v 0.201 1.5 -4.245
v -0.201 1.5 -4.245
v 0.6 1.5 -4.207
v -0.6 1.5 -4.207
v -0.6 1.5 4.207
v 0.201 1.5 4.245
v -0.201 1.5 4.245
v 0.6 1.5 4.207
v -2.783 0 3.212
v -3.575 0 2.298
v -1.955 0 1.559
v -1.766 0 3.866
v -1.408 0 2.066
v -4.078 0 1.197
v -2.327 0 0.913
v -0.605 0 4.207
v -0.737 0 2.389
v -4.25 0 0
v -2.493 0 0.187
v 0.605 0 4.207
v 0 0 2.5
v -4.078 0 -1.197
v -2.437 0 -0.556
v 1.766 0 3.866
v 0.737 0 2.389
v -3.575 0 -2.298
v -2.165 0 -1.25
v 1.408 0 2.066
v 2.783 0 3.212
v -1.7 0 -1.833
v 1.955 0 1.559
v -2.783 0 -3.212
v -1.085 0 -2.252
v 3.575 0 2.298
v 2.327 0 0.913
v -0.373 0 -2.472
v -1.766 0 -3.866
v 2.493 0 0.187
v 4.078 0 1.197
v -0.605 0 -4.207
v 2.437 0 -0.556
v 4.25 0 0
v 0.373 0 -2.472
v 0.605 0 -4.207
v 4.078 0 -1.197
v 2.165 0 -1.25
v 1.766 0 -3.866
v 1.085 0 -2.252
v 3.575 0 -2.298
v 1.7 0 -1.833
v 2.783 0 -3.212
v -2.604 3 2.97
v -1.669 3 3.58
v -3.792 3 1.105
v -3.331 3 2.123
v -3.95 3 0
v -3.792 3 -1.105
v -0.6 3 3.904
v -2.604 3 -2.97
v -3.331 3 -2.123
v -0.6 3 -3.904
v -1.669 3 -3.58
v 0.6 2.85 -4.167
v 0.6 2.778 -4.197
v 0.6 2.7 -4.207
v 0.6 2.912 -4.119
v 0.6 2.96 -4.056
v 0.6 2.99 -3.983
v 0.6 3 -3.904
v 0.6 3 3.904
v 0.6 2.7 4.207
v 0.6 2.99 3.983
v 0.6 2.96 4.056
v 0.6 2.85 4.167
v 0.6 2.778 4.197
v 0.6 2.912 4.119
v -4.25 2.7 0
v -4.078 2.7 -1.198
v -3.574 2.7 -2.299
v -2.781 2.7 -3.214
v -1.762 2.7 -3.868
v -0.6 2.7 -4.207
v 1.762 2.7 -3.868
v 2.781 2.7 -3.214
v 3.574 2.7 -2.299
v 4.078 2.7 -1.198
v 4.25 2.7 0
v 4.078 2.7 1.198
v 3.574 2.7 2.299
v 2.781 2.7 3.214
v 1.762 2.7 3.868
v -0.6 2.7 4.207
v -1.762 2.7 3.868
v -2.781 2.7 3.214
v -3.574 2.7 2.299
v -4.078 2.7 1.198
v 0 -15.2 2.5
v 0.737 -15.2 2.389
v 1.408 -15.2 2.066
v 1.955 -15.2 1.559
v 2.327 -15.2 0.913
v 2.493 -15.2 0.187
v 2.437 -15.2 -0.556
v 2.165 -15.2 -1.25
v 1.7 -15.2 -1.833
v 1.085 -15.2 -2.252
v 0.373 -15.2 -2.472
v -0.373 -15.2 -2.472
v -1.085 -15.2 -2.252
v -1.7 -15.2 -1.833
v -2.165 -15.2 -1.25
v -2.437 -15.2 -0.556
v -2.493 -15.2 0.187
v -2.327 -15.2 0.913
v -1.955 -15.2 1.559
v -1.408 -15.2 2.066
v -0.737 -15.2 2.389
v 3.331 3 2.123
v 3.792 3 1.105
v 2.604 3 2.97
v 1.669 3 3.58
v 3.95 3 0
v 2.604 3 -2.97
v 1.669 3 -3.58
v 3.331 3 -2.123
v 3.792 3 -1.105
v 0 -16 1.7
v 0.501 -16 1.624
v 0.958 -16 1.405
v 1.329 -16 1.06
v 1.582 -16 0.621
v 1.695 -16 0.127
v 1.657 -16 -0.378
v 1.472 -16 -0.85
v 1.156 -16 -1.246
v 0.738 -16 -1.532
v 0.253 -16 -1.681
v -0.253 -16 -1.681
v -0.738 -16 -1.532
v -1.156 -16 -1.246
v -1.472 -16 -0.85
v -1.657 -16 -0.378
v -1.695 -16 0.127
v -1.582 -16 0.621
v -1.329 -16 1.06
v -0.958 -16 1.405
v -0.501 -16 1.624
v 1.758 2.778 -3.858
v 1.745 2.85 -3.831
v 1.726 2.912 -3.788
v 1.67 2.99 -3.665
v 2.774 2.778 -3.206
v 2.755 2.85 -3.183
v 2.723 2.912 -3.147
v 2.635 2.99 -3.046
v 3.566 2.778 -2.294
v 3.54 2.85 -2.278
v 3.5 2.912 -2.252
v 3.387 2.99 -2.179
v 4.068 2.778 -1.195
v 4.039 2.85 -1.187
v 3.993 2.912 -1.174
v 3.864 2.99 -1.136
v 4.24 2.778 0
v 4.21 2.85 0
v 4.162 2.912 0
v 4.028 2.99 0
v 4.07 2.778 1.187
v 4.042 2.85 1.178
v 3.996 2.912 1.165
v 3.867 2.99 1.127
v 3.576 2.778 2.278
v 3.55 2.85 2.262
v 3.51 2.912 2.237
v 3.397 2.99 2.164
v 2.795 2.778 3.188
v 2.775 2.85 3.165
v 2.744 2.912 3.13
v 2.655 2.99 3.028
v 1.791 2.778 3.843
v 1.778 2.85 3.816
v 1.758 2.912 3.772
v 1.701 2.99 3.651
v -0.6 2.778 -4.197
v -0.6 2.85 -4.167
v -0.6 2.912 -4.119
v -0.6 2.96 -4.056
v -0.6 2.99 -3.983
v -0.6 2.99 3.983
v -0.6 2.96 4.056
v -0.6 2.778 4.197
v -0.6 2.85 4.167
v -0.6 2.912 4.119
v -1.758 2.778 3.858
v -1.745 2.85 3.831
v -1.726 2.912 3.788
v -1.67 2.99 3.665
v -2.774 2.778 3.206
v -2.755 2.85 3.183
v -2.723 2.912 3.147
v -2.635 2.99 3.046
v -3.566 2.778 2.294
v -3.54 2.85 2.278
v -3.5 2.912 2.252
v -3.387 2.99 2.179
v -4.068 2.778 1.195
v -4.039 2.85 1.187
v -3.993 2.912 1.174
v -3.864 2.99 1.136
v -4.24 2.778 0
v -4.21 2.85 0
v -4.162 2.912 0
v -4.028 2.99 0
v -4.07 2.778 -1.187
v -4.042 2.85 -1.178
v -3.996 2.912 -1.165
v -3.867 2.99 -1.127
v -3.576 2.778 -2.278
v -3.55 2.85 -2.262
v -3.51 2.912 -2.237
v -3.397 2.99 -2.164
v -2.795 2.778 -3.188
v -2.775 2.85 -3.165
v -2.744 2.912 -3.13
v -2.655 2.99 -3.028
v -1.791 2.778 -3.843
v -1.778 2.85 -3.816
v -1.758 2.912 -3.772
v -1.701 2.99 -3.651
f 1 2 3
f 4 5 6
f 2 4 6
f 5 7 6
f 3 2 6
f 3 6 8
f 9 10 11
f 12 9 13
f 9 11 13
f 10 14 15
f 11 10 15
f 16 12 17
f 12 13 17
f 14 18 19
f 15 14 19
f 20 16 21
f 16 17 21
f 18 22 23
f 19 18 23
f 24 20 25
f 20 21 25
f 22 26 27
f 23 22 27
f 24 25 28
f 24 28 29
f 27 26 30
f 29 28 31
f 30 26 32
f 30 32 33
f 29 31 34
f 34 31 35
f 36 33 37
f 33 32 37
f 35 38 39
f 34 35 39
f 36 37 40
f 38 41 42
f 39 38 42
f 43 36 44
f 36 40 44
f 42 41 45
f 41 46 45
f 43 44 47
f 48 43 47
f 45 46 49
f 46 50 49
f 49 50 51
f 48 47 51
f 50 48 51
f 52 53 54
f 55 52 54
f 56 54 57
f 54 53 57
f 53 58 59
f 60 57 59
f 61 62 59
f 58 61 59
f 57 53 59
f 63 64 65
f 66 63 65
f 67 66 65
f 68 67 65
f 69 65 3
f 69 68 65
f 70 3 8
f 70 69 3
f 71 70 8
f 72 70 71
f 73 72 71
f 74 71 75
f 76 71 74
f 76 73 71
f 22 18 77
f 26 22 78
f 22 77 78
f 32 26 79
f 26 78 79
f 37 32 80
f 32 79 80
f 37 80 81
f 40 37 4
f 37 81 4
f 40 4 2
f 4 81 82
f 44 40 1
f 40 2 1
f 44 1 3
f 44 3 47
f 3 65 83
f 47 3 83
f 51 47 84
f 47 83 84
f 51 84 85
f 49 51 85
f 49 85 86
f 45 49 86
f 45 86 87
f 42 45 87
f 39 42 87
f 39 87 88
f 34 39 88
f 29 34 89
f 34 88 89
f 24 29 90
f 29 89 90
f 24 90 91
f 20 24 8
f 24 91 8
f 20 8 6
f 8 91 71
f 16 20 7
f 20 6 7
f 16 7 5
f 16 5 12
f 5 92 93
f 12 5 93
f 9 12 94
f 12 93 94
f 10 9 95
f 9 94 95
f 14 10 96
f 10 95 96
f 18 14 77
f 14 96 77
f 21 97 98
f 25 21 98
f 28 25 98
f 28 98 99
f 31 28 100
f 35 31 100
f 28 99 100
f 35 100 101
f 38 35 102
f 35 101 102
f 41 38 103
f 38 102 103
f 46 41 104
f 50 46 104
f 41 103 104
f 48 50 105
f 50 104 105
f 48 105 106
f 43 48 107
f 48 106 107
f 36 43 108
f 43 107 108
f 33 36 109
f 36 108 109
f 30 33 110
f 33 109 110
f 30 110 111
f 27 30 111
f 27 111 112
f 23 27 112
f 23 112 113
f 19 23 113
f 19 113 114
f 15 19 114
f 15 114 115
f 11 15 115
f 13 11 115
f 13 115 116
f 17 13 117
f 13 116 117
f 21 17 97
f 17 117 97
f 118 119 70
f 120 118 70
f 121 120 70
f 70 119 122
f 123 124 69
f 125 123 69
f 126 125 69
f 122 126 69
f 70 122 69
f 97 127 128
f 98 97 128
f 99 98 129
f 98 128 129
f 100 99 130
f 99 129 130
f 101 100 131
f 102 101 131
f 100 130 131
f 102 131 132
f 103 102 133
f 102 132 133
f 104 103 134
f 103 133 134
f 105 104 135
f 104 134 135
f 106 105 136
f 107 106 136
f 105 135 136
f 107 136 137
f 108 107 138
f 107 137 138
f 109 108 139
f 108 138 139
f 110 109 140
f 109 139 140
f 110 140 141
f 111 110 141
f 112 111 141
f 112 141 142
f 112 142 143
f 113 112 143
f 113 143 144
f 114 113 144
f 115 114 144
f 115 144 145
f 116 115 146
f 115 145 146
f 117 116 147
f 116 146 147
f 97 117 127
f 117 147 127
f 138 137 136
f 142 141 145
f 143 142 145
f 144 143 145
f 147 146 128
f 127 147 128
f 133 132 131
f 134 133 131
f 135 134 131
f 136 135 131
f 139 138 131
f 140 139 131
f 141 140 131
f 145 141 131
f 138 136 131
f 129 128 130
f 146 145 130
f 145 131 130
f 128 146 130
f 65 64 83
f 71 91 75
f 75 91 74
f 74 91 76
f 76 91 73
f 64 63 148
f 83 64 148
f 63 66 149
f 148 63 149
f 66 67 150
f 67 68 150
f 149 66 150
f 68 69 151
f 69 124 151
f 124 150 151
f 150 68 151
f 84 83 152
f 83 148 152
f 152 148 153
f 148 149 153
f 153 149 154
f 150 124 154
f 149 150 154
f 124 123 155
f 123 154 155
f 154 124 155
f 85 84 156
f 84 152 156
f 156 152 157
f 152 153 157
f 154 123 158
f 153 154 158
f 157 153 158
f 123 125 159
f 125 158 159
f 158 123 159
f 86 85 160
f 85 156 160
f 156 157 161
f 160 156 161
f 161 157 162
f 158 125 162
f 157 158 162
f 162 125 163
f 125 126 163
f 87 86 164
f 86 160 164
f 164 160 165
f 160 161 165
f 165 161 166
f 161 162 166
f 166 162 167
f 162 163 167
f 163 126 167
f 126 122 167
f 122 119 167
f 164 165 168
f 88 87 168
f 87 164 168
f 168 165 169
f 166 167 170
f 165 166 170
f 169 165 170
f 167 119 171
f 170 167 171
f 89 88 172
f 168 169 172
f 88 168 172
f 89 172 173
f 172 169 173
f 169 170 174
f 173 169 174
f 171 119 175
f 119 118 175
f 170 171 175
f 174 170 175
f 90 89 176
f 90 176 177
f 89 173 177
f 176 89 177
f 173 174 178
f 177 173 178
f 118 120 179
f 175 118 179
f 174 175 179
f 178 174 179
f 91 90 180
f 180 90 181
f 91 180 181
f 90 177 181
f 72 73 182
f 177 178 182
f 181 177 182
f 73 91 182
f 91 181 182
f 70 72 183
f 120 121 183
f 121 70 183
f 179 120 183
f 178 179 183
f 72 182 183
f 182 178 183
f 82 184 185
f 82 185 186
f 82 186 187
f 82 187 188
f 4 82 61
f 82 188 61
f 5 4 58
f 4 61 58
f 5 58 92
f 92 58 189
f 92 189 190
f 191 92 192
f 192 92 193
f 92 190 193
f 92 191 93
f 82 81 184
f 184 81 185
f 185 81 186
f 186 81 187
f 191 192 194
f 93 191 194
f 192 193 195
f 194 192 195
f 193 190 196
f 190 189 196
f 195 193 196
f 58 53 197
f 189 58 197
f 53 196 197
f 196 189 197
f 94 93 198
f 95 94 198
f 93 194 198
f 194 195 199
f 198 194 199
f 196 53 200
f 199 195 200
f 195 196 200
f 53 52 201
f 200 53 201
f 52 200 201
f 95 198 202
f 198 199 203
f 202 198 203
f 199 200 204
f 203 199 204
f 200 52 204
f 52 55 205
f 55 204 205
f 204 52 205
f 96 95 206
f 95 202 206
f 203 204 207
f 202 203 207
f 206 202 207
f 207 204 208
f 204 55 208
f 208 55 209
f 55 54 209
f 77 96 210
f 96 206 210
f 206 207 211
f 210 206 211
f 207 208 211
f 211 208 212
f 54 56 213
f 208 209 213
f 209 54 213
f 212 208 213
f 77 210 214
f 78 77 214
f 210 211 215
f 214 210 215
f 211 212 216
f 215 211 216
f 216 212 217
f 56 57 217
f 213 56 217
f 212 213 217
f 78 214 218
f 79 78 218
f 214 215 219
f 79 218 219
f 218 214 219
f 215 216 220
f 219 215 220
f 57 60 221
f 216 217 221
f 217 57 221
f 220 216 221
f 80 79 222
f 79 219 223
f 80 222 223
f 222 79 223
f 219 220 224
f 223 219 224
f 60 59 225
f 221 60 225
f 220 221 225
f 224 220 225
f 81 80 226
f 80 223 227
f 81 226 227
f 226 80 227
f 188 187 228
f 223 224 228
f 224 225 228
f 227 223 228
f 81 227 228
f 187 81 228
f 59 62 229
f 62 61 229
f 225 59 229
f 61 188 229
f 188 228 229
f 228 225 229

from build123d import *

# Parameters (mm, degrees)
TIGE_START              = -16
ESQUISSE1_R             = 2.5
TIGE_DEPTH              = 16
CHANFREIN_D_ENTR_E_SIZE = 0.8
ESQUISSE3_W             = 1.2
ESQUISSE3_H             = 8.5
FENTE_DEPTH             = 1.5


with BuildPart() as part:
    # Esquisse1 → Tige (new body)
    with BuildSketch(Plane(origin=(0, 0, 0), x_dir=(1, 0, 0), z_dir=(0, 1, 0)).offset(TIGE_START)):
        with Locations(Location((0, 0, 0), (0, 0, 270))):
            Circle(ESQUISSE1_R)
    extrude(amount=TIGE_DEPTH)

    # Chanfrein d'entrée
    chanfrein_d_entr_e_edges = [part.edges().sort_by_distance(p)[0] for p in [
        (0, -16, -2.5),
    ]]
    chamfer(chanfrein_d_entr_e_edges, length=CHANFREIN_D_ENTR_E_SIZE)

    # Esquisse2 → Tête (revolve)
    with BuildSketch(Plane.XY, mode=Mode.PRIVATE) as t_te_sk:
        with BuildLine():
            Line((0, 0), (4.25, 0))
            Line((4.25, 0), (4.25, 2.7))
            ThreePointArc((4.25, 2.7), (4.162132034, 2.912132034), (3.95, 3))
            Line((3.95, 3), (0, 3))
            Line((0, 3), (0, 0))
        make_face()
    revolve(t_te_sk.sketch.rotate(Axis((0, 3, 0), (0, -1, 0)), 180), axis=Axis((0, 3, 0), (0, -1, 0)))

    # Esquisse3 → Fente (cut)
    with BuildSketch(Plane(origin=(0, 3, -1.8), x_dir=(1, 0, 0), z_dir=(0, -1, 0))):
        with Locations((0, 1.8)):
            Rectangle(ESQUISSE3_W, ESQUISSE3_H)
    extrude(amount=FENTE_DEPTH, mode=Mode.SUBTRACT)


solid = part.part
